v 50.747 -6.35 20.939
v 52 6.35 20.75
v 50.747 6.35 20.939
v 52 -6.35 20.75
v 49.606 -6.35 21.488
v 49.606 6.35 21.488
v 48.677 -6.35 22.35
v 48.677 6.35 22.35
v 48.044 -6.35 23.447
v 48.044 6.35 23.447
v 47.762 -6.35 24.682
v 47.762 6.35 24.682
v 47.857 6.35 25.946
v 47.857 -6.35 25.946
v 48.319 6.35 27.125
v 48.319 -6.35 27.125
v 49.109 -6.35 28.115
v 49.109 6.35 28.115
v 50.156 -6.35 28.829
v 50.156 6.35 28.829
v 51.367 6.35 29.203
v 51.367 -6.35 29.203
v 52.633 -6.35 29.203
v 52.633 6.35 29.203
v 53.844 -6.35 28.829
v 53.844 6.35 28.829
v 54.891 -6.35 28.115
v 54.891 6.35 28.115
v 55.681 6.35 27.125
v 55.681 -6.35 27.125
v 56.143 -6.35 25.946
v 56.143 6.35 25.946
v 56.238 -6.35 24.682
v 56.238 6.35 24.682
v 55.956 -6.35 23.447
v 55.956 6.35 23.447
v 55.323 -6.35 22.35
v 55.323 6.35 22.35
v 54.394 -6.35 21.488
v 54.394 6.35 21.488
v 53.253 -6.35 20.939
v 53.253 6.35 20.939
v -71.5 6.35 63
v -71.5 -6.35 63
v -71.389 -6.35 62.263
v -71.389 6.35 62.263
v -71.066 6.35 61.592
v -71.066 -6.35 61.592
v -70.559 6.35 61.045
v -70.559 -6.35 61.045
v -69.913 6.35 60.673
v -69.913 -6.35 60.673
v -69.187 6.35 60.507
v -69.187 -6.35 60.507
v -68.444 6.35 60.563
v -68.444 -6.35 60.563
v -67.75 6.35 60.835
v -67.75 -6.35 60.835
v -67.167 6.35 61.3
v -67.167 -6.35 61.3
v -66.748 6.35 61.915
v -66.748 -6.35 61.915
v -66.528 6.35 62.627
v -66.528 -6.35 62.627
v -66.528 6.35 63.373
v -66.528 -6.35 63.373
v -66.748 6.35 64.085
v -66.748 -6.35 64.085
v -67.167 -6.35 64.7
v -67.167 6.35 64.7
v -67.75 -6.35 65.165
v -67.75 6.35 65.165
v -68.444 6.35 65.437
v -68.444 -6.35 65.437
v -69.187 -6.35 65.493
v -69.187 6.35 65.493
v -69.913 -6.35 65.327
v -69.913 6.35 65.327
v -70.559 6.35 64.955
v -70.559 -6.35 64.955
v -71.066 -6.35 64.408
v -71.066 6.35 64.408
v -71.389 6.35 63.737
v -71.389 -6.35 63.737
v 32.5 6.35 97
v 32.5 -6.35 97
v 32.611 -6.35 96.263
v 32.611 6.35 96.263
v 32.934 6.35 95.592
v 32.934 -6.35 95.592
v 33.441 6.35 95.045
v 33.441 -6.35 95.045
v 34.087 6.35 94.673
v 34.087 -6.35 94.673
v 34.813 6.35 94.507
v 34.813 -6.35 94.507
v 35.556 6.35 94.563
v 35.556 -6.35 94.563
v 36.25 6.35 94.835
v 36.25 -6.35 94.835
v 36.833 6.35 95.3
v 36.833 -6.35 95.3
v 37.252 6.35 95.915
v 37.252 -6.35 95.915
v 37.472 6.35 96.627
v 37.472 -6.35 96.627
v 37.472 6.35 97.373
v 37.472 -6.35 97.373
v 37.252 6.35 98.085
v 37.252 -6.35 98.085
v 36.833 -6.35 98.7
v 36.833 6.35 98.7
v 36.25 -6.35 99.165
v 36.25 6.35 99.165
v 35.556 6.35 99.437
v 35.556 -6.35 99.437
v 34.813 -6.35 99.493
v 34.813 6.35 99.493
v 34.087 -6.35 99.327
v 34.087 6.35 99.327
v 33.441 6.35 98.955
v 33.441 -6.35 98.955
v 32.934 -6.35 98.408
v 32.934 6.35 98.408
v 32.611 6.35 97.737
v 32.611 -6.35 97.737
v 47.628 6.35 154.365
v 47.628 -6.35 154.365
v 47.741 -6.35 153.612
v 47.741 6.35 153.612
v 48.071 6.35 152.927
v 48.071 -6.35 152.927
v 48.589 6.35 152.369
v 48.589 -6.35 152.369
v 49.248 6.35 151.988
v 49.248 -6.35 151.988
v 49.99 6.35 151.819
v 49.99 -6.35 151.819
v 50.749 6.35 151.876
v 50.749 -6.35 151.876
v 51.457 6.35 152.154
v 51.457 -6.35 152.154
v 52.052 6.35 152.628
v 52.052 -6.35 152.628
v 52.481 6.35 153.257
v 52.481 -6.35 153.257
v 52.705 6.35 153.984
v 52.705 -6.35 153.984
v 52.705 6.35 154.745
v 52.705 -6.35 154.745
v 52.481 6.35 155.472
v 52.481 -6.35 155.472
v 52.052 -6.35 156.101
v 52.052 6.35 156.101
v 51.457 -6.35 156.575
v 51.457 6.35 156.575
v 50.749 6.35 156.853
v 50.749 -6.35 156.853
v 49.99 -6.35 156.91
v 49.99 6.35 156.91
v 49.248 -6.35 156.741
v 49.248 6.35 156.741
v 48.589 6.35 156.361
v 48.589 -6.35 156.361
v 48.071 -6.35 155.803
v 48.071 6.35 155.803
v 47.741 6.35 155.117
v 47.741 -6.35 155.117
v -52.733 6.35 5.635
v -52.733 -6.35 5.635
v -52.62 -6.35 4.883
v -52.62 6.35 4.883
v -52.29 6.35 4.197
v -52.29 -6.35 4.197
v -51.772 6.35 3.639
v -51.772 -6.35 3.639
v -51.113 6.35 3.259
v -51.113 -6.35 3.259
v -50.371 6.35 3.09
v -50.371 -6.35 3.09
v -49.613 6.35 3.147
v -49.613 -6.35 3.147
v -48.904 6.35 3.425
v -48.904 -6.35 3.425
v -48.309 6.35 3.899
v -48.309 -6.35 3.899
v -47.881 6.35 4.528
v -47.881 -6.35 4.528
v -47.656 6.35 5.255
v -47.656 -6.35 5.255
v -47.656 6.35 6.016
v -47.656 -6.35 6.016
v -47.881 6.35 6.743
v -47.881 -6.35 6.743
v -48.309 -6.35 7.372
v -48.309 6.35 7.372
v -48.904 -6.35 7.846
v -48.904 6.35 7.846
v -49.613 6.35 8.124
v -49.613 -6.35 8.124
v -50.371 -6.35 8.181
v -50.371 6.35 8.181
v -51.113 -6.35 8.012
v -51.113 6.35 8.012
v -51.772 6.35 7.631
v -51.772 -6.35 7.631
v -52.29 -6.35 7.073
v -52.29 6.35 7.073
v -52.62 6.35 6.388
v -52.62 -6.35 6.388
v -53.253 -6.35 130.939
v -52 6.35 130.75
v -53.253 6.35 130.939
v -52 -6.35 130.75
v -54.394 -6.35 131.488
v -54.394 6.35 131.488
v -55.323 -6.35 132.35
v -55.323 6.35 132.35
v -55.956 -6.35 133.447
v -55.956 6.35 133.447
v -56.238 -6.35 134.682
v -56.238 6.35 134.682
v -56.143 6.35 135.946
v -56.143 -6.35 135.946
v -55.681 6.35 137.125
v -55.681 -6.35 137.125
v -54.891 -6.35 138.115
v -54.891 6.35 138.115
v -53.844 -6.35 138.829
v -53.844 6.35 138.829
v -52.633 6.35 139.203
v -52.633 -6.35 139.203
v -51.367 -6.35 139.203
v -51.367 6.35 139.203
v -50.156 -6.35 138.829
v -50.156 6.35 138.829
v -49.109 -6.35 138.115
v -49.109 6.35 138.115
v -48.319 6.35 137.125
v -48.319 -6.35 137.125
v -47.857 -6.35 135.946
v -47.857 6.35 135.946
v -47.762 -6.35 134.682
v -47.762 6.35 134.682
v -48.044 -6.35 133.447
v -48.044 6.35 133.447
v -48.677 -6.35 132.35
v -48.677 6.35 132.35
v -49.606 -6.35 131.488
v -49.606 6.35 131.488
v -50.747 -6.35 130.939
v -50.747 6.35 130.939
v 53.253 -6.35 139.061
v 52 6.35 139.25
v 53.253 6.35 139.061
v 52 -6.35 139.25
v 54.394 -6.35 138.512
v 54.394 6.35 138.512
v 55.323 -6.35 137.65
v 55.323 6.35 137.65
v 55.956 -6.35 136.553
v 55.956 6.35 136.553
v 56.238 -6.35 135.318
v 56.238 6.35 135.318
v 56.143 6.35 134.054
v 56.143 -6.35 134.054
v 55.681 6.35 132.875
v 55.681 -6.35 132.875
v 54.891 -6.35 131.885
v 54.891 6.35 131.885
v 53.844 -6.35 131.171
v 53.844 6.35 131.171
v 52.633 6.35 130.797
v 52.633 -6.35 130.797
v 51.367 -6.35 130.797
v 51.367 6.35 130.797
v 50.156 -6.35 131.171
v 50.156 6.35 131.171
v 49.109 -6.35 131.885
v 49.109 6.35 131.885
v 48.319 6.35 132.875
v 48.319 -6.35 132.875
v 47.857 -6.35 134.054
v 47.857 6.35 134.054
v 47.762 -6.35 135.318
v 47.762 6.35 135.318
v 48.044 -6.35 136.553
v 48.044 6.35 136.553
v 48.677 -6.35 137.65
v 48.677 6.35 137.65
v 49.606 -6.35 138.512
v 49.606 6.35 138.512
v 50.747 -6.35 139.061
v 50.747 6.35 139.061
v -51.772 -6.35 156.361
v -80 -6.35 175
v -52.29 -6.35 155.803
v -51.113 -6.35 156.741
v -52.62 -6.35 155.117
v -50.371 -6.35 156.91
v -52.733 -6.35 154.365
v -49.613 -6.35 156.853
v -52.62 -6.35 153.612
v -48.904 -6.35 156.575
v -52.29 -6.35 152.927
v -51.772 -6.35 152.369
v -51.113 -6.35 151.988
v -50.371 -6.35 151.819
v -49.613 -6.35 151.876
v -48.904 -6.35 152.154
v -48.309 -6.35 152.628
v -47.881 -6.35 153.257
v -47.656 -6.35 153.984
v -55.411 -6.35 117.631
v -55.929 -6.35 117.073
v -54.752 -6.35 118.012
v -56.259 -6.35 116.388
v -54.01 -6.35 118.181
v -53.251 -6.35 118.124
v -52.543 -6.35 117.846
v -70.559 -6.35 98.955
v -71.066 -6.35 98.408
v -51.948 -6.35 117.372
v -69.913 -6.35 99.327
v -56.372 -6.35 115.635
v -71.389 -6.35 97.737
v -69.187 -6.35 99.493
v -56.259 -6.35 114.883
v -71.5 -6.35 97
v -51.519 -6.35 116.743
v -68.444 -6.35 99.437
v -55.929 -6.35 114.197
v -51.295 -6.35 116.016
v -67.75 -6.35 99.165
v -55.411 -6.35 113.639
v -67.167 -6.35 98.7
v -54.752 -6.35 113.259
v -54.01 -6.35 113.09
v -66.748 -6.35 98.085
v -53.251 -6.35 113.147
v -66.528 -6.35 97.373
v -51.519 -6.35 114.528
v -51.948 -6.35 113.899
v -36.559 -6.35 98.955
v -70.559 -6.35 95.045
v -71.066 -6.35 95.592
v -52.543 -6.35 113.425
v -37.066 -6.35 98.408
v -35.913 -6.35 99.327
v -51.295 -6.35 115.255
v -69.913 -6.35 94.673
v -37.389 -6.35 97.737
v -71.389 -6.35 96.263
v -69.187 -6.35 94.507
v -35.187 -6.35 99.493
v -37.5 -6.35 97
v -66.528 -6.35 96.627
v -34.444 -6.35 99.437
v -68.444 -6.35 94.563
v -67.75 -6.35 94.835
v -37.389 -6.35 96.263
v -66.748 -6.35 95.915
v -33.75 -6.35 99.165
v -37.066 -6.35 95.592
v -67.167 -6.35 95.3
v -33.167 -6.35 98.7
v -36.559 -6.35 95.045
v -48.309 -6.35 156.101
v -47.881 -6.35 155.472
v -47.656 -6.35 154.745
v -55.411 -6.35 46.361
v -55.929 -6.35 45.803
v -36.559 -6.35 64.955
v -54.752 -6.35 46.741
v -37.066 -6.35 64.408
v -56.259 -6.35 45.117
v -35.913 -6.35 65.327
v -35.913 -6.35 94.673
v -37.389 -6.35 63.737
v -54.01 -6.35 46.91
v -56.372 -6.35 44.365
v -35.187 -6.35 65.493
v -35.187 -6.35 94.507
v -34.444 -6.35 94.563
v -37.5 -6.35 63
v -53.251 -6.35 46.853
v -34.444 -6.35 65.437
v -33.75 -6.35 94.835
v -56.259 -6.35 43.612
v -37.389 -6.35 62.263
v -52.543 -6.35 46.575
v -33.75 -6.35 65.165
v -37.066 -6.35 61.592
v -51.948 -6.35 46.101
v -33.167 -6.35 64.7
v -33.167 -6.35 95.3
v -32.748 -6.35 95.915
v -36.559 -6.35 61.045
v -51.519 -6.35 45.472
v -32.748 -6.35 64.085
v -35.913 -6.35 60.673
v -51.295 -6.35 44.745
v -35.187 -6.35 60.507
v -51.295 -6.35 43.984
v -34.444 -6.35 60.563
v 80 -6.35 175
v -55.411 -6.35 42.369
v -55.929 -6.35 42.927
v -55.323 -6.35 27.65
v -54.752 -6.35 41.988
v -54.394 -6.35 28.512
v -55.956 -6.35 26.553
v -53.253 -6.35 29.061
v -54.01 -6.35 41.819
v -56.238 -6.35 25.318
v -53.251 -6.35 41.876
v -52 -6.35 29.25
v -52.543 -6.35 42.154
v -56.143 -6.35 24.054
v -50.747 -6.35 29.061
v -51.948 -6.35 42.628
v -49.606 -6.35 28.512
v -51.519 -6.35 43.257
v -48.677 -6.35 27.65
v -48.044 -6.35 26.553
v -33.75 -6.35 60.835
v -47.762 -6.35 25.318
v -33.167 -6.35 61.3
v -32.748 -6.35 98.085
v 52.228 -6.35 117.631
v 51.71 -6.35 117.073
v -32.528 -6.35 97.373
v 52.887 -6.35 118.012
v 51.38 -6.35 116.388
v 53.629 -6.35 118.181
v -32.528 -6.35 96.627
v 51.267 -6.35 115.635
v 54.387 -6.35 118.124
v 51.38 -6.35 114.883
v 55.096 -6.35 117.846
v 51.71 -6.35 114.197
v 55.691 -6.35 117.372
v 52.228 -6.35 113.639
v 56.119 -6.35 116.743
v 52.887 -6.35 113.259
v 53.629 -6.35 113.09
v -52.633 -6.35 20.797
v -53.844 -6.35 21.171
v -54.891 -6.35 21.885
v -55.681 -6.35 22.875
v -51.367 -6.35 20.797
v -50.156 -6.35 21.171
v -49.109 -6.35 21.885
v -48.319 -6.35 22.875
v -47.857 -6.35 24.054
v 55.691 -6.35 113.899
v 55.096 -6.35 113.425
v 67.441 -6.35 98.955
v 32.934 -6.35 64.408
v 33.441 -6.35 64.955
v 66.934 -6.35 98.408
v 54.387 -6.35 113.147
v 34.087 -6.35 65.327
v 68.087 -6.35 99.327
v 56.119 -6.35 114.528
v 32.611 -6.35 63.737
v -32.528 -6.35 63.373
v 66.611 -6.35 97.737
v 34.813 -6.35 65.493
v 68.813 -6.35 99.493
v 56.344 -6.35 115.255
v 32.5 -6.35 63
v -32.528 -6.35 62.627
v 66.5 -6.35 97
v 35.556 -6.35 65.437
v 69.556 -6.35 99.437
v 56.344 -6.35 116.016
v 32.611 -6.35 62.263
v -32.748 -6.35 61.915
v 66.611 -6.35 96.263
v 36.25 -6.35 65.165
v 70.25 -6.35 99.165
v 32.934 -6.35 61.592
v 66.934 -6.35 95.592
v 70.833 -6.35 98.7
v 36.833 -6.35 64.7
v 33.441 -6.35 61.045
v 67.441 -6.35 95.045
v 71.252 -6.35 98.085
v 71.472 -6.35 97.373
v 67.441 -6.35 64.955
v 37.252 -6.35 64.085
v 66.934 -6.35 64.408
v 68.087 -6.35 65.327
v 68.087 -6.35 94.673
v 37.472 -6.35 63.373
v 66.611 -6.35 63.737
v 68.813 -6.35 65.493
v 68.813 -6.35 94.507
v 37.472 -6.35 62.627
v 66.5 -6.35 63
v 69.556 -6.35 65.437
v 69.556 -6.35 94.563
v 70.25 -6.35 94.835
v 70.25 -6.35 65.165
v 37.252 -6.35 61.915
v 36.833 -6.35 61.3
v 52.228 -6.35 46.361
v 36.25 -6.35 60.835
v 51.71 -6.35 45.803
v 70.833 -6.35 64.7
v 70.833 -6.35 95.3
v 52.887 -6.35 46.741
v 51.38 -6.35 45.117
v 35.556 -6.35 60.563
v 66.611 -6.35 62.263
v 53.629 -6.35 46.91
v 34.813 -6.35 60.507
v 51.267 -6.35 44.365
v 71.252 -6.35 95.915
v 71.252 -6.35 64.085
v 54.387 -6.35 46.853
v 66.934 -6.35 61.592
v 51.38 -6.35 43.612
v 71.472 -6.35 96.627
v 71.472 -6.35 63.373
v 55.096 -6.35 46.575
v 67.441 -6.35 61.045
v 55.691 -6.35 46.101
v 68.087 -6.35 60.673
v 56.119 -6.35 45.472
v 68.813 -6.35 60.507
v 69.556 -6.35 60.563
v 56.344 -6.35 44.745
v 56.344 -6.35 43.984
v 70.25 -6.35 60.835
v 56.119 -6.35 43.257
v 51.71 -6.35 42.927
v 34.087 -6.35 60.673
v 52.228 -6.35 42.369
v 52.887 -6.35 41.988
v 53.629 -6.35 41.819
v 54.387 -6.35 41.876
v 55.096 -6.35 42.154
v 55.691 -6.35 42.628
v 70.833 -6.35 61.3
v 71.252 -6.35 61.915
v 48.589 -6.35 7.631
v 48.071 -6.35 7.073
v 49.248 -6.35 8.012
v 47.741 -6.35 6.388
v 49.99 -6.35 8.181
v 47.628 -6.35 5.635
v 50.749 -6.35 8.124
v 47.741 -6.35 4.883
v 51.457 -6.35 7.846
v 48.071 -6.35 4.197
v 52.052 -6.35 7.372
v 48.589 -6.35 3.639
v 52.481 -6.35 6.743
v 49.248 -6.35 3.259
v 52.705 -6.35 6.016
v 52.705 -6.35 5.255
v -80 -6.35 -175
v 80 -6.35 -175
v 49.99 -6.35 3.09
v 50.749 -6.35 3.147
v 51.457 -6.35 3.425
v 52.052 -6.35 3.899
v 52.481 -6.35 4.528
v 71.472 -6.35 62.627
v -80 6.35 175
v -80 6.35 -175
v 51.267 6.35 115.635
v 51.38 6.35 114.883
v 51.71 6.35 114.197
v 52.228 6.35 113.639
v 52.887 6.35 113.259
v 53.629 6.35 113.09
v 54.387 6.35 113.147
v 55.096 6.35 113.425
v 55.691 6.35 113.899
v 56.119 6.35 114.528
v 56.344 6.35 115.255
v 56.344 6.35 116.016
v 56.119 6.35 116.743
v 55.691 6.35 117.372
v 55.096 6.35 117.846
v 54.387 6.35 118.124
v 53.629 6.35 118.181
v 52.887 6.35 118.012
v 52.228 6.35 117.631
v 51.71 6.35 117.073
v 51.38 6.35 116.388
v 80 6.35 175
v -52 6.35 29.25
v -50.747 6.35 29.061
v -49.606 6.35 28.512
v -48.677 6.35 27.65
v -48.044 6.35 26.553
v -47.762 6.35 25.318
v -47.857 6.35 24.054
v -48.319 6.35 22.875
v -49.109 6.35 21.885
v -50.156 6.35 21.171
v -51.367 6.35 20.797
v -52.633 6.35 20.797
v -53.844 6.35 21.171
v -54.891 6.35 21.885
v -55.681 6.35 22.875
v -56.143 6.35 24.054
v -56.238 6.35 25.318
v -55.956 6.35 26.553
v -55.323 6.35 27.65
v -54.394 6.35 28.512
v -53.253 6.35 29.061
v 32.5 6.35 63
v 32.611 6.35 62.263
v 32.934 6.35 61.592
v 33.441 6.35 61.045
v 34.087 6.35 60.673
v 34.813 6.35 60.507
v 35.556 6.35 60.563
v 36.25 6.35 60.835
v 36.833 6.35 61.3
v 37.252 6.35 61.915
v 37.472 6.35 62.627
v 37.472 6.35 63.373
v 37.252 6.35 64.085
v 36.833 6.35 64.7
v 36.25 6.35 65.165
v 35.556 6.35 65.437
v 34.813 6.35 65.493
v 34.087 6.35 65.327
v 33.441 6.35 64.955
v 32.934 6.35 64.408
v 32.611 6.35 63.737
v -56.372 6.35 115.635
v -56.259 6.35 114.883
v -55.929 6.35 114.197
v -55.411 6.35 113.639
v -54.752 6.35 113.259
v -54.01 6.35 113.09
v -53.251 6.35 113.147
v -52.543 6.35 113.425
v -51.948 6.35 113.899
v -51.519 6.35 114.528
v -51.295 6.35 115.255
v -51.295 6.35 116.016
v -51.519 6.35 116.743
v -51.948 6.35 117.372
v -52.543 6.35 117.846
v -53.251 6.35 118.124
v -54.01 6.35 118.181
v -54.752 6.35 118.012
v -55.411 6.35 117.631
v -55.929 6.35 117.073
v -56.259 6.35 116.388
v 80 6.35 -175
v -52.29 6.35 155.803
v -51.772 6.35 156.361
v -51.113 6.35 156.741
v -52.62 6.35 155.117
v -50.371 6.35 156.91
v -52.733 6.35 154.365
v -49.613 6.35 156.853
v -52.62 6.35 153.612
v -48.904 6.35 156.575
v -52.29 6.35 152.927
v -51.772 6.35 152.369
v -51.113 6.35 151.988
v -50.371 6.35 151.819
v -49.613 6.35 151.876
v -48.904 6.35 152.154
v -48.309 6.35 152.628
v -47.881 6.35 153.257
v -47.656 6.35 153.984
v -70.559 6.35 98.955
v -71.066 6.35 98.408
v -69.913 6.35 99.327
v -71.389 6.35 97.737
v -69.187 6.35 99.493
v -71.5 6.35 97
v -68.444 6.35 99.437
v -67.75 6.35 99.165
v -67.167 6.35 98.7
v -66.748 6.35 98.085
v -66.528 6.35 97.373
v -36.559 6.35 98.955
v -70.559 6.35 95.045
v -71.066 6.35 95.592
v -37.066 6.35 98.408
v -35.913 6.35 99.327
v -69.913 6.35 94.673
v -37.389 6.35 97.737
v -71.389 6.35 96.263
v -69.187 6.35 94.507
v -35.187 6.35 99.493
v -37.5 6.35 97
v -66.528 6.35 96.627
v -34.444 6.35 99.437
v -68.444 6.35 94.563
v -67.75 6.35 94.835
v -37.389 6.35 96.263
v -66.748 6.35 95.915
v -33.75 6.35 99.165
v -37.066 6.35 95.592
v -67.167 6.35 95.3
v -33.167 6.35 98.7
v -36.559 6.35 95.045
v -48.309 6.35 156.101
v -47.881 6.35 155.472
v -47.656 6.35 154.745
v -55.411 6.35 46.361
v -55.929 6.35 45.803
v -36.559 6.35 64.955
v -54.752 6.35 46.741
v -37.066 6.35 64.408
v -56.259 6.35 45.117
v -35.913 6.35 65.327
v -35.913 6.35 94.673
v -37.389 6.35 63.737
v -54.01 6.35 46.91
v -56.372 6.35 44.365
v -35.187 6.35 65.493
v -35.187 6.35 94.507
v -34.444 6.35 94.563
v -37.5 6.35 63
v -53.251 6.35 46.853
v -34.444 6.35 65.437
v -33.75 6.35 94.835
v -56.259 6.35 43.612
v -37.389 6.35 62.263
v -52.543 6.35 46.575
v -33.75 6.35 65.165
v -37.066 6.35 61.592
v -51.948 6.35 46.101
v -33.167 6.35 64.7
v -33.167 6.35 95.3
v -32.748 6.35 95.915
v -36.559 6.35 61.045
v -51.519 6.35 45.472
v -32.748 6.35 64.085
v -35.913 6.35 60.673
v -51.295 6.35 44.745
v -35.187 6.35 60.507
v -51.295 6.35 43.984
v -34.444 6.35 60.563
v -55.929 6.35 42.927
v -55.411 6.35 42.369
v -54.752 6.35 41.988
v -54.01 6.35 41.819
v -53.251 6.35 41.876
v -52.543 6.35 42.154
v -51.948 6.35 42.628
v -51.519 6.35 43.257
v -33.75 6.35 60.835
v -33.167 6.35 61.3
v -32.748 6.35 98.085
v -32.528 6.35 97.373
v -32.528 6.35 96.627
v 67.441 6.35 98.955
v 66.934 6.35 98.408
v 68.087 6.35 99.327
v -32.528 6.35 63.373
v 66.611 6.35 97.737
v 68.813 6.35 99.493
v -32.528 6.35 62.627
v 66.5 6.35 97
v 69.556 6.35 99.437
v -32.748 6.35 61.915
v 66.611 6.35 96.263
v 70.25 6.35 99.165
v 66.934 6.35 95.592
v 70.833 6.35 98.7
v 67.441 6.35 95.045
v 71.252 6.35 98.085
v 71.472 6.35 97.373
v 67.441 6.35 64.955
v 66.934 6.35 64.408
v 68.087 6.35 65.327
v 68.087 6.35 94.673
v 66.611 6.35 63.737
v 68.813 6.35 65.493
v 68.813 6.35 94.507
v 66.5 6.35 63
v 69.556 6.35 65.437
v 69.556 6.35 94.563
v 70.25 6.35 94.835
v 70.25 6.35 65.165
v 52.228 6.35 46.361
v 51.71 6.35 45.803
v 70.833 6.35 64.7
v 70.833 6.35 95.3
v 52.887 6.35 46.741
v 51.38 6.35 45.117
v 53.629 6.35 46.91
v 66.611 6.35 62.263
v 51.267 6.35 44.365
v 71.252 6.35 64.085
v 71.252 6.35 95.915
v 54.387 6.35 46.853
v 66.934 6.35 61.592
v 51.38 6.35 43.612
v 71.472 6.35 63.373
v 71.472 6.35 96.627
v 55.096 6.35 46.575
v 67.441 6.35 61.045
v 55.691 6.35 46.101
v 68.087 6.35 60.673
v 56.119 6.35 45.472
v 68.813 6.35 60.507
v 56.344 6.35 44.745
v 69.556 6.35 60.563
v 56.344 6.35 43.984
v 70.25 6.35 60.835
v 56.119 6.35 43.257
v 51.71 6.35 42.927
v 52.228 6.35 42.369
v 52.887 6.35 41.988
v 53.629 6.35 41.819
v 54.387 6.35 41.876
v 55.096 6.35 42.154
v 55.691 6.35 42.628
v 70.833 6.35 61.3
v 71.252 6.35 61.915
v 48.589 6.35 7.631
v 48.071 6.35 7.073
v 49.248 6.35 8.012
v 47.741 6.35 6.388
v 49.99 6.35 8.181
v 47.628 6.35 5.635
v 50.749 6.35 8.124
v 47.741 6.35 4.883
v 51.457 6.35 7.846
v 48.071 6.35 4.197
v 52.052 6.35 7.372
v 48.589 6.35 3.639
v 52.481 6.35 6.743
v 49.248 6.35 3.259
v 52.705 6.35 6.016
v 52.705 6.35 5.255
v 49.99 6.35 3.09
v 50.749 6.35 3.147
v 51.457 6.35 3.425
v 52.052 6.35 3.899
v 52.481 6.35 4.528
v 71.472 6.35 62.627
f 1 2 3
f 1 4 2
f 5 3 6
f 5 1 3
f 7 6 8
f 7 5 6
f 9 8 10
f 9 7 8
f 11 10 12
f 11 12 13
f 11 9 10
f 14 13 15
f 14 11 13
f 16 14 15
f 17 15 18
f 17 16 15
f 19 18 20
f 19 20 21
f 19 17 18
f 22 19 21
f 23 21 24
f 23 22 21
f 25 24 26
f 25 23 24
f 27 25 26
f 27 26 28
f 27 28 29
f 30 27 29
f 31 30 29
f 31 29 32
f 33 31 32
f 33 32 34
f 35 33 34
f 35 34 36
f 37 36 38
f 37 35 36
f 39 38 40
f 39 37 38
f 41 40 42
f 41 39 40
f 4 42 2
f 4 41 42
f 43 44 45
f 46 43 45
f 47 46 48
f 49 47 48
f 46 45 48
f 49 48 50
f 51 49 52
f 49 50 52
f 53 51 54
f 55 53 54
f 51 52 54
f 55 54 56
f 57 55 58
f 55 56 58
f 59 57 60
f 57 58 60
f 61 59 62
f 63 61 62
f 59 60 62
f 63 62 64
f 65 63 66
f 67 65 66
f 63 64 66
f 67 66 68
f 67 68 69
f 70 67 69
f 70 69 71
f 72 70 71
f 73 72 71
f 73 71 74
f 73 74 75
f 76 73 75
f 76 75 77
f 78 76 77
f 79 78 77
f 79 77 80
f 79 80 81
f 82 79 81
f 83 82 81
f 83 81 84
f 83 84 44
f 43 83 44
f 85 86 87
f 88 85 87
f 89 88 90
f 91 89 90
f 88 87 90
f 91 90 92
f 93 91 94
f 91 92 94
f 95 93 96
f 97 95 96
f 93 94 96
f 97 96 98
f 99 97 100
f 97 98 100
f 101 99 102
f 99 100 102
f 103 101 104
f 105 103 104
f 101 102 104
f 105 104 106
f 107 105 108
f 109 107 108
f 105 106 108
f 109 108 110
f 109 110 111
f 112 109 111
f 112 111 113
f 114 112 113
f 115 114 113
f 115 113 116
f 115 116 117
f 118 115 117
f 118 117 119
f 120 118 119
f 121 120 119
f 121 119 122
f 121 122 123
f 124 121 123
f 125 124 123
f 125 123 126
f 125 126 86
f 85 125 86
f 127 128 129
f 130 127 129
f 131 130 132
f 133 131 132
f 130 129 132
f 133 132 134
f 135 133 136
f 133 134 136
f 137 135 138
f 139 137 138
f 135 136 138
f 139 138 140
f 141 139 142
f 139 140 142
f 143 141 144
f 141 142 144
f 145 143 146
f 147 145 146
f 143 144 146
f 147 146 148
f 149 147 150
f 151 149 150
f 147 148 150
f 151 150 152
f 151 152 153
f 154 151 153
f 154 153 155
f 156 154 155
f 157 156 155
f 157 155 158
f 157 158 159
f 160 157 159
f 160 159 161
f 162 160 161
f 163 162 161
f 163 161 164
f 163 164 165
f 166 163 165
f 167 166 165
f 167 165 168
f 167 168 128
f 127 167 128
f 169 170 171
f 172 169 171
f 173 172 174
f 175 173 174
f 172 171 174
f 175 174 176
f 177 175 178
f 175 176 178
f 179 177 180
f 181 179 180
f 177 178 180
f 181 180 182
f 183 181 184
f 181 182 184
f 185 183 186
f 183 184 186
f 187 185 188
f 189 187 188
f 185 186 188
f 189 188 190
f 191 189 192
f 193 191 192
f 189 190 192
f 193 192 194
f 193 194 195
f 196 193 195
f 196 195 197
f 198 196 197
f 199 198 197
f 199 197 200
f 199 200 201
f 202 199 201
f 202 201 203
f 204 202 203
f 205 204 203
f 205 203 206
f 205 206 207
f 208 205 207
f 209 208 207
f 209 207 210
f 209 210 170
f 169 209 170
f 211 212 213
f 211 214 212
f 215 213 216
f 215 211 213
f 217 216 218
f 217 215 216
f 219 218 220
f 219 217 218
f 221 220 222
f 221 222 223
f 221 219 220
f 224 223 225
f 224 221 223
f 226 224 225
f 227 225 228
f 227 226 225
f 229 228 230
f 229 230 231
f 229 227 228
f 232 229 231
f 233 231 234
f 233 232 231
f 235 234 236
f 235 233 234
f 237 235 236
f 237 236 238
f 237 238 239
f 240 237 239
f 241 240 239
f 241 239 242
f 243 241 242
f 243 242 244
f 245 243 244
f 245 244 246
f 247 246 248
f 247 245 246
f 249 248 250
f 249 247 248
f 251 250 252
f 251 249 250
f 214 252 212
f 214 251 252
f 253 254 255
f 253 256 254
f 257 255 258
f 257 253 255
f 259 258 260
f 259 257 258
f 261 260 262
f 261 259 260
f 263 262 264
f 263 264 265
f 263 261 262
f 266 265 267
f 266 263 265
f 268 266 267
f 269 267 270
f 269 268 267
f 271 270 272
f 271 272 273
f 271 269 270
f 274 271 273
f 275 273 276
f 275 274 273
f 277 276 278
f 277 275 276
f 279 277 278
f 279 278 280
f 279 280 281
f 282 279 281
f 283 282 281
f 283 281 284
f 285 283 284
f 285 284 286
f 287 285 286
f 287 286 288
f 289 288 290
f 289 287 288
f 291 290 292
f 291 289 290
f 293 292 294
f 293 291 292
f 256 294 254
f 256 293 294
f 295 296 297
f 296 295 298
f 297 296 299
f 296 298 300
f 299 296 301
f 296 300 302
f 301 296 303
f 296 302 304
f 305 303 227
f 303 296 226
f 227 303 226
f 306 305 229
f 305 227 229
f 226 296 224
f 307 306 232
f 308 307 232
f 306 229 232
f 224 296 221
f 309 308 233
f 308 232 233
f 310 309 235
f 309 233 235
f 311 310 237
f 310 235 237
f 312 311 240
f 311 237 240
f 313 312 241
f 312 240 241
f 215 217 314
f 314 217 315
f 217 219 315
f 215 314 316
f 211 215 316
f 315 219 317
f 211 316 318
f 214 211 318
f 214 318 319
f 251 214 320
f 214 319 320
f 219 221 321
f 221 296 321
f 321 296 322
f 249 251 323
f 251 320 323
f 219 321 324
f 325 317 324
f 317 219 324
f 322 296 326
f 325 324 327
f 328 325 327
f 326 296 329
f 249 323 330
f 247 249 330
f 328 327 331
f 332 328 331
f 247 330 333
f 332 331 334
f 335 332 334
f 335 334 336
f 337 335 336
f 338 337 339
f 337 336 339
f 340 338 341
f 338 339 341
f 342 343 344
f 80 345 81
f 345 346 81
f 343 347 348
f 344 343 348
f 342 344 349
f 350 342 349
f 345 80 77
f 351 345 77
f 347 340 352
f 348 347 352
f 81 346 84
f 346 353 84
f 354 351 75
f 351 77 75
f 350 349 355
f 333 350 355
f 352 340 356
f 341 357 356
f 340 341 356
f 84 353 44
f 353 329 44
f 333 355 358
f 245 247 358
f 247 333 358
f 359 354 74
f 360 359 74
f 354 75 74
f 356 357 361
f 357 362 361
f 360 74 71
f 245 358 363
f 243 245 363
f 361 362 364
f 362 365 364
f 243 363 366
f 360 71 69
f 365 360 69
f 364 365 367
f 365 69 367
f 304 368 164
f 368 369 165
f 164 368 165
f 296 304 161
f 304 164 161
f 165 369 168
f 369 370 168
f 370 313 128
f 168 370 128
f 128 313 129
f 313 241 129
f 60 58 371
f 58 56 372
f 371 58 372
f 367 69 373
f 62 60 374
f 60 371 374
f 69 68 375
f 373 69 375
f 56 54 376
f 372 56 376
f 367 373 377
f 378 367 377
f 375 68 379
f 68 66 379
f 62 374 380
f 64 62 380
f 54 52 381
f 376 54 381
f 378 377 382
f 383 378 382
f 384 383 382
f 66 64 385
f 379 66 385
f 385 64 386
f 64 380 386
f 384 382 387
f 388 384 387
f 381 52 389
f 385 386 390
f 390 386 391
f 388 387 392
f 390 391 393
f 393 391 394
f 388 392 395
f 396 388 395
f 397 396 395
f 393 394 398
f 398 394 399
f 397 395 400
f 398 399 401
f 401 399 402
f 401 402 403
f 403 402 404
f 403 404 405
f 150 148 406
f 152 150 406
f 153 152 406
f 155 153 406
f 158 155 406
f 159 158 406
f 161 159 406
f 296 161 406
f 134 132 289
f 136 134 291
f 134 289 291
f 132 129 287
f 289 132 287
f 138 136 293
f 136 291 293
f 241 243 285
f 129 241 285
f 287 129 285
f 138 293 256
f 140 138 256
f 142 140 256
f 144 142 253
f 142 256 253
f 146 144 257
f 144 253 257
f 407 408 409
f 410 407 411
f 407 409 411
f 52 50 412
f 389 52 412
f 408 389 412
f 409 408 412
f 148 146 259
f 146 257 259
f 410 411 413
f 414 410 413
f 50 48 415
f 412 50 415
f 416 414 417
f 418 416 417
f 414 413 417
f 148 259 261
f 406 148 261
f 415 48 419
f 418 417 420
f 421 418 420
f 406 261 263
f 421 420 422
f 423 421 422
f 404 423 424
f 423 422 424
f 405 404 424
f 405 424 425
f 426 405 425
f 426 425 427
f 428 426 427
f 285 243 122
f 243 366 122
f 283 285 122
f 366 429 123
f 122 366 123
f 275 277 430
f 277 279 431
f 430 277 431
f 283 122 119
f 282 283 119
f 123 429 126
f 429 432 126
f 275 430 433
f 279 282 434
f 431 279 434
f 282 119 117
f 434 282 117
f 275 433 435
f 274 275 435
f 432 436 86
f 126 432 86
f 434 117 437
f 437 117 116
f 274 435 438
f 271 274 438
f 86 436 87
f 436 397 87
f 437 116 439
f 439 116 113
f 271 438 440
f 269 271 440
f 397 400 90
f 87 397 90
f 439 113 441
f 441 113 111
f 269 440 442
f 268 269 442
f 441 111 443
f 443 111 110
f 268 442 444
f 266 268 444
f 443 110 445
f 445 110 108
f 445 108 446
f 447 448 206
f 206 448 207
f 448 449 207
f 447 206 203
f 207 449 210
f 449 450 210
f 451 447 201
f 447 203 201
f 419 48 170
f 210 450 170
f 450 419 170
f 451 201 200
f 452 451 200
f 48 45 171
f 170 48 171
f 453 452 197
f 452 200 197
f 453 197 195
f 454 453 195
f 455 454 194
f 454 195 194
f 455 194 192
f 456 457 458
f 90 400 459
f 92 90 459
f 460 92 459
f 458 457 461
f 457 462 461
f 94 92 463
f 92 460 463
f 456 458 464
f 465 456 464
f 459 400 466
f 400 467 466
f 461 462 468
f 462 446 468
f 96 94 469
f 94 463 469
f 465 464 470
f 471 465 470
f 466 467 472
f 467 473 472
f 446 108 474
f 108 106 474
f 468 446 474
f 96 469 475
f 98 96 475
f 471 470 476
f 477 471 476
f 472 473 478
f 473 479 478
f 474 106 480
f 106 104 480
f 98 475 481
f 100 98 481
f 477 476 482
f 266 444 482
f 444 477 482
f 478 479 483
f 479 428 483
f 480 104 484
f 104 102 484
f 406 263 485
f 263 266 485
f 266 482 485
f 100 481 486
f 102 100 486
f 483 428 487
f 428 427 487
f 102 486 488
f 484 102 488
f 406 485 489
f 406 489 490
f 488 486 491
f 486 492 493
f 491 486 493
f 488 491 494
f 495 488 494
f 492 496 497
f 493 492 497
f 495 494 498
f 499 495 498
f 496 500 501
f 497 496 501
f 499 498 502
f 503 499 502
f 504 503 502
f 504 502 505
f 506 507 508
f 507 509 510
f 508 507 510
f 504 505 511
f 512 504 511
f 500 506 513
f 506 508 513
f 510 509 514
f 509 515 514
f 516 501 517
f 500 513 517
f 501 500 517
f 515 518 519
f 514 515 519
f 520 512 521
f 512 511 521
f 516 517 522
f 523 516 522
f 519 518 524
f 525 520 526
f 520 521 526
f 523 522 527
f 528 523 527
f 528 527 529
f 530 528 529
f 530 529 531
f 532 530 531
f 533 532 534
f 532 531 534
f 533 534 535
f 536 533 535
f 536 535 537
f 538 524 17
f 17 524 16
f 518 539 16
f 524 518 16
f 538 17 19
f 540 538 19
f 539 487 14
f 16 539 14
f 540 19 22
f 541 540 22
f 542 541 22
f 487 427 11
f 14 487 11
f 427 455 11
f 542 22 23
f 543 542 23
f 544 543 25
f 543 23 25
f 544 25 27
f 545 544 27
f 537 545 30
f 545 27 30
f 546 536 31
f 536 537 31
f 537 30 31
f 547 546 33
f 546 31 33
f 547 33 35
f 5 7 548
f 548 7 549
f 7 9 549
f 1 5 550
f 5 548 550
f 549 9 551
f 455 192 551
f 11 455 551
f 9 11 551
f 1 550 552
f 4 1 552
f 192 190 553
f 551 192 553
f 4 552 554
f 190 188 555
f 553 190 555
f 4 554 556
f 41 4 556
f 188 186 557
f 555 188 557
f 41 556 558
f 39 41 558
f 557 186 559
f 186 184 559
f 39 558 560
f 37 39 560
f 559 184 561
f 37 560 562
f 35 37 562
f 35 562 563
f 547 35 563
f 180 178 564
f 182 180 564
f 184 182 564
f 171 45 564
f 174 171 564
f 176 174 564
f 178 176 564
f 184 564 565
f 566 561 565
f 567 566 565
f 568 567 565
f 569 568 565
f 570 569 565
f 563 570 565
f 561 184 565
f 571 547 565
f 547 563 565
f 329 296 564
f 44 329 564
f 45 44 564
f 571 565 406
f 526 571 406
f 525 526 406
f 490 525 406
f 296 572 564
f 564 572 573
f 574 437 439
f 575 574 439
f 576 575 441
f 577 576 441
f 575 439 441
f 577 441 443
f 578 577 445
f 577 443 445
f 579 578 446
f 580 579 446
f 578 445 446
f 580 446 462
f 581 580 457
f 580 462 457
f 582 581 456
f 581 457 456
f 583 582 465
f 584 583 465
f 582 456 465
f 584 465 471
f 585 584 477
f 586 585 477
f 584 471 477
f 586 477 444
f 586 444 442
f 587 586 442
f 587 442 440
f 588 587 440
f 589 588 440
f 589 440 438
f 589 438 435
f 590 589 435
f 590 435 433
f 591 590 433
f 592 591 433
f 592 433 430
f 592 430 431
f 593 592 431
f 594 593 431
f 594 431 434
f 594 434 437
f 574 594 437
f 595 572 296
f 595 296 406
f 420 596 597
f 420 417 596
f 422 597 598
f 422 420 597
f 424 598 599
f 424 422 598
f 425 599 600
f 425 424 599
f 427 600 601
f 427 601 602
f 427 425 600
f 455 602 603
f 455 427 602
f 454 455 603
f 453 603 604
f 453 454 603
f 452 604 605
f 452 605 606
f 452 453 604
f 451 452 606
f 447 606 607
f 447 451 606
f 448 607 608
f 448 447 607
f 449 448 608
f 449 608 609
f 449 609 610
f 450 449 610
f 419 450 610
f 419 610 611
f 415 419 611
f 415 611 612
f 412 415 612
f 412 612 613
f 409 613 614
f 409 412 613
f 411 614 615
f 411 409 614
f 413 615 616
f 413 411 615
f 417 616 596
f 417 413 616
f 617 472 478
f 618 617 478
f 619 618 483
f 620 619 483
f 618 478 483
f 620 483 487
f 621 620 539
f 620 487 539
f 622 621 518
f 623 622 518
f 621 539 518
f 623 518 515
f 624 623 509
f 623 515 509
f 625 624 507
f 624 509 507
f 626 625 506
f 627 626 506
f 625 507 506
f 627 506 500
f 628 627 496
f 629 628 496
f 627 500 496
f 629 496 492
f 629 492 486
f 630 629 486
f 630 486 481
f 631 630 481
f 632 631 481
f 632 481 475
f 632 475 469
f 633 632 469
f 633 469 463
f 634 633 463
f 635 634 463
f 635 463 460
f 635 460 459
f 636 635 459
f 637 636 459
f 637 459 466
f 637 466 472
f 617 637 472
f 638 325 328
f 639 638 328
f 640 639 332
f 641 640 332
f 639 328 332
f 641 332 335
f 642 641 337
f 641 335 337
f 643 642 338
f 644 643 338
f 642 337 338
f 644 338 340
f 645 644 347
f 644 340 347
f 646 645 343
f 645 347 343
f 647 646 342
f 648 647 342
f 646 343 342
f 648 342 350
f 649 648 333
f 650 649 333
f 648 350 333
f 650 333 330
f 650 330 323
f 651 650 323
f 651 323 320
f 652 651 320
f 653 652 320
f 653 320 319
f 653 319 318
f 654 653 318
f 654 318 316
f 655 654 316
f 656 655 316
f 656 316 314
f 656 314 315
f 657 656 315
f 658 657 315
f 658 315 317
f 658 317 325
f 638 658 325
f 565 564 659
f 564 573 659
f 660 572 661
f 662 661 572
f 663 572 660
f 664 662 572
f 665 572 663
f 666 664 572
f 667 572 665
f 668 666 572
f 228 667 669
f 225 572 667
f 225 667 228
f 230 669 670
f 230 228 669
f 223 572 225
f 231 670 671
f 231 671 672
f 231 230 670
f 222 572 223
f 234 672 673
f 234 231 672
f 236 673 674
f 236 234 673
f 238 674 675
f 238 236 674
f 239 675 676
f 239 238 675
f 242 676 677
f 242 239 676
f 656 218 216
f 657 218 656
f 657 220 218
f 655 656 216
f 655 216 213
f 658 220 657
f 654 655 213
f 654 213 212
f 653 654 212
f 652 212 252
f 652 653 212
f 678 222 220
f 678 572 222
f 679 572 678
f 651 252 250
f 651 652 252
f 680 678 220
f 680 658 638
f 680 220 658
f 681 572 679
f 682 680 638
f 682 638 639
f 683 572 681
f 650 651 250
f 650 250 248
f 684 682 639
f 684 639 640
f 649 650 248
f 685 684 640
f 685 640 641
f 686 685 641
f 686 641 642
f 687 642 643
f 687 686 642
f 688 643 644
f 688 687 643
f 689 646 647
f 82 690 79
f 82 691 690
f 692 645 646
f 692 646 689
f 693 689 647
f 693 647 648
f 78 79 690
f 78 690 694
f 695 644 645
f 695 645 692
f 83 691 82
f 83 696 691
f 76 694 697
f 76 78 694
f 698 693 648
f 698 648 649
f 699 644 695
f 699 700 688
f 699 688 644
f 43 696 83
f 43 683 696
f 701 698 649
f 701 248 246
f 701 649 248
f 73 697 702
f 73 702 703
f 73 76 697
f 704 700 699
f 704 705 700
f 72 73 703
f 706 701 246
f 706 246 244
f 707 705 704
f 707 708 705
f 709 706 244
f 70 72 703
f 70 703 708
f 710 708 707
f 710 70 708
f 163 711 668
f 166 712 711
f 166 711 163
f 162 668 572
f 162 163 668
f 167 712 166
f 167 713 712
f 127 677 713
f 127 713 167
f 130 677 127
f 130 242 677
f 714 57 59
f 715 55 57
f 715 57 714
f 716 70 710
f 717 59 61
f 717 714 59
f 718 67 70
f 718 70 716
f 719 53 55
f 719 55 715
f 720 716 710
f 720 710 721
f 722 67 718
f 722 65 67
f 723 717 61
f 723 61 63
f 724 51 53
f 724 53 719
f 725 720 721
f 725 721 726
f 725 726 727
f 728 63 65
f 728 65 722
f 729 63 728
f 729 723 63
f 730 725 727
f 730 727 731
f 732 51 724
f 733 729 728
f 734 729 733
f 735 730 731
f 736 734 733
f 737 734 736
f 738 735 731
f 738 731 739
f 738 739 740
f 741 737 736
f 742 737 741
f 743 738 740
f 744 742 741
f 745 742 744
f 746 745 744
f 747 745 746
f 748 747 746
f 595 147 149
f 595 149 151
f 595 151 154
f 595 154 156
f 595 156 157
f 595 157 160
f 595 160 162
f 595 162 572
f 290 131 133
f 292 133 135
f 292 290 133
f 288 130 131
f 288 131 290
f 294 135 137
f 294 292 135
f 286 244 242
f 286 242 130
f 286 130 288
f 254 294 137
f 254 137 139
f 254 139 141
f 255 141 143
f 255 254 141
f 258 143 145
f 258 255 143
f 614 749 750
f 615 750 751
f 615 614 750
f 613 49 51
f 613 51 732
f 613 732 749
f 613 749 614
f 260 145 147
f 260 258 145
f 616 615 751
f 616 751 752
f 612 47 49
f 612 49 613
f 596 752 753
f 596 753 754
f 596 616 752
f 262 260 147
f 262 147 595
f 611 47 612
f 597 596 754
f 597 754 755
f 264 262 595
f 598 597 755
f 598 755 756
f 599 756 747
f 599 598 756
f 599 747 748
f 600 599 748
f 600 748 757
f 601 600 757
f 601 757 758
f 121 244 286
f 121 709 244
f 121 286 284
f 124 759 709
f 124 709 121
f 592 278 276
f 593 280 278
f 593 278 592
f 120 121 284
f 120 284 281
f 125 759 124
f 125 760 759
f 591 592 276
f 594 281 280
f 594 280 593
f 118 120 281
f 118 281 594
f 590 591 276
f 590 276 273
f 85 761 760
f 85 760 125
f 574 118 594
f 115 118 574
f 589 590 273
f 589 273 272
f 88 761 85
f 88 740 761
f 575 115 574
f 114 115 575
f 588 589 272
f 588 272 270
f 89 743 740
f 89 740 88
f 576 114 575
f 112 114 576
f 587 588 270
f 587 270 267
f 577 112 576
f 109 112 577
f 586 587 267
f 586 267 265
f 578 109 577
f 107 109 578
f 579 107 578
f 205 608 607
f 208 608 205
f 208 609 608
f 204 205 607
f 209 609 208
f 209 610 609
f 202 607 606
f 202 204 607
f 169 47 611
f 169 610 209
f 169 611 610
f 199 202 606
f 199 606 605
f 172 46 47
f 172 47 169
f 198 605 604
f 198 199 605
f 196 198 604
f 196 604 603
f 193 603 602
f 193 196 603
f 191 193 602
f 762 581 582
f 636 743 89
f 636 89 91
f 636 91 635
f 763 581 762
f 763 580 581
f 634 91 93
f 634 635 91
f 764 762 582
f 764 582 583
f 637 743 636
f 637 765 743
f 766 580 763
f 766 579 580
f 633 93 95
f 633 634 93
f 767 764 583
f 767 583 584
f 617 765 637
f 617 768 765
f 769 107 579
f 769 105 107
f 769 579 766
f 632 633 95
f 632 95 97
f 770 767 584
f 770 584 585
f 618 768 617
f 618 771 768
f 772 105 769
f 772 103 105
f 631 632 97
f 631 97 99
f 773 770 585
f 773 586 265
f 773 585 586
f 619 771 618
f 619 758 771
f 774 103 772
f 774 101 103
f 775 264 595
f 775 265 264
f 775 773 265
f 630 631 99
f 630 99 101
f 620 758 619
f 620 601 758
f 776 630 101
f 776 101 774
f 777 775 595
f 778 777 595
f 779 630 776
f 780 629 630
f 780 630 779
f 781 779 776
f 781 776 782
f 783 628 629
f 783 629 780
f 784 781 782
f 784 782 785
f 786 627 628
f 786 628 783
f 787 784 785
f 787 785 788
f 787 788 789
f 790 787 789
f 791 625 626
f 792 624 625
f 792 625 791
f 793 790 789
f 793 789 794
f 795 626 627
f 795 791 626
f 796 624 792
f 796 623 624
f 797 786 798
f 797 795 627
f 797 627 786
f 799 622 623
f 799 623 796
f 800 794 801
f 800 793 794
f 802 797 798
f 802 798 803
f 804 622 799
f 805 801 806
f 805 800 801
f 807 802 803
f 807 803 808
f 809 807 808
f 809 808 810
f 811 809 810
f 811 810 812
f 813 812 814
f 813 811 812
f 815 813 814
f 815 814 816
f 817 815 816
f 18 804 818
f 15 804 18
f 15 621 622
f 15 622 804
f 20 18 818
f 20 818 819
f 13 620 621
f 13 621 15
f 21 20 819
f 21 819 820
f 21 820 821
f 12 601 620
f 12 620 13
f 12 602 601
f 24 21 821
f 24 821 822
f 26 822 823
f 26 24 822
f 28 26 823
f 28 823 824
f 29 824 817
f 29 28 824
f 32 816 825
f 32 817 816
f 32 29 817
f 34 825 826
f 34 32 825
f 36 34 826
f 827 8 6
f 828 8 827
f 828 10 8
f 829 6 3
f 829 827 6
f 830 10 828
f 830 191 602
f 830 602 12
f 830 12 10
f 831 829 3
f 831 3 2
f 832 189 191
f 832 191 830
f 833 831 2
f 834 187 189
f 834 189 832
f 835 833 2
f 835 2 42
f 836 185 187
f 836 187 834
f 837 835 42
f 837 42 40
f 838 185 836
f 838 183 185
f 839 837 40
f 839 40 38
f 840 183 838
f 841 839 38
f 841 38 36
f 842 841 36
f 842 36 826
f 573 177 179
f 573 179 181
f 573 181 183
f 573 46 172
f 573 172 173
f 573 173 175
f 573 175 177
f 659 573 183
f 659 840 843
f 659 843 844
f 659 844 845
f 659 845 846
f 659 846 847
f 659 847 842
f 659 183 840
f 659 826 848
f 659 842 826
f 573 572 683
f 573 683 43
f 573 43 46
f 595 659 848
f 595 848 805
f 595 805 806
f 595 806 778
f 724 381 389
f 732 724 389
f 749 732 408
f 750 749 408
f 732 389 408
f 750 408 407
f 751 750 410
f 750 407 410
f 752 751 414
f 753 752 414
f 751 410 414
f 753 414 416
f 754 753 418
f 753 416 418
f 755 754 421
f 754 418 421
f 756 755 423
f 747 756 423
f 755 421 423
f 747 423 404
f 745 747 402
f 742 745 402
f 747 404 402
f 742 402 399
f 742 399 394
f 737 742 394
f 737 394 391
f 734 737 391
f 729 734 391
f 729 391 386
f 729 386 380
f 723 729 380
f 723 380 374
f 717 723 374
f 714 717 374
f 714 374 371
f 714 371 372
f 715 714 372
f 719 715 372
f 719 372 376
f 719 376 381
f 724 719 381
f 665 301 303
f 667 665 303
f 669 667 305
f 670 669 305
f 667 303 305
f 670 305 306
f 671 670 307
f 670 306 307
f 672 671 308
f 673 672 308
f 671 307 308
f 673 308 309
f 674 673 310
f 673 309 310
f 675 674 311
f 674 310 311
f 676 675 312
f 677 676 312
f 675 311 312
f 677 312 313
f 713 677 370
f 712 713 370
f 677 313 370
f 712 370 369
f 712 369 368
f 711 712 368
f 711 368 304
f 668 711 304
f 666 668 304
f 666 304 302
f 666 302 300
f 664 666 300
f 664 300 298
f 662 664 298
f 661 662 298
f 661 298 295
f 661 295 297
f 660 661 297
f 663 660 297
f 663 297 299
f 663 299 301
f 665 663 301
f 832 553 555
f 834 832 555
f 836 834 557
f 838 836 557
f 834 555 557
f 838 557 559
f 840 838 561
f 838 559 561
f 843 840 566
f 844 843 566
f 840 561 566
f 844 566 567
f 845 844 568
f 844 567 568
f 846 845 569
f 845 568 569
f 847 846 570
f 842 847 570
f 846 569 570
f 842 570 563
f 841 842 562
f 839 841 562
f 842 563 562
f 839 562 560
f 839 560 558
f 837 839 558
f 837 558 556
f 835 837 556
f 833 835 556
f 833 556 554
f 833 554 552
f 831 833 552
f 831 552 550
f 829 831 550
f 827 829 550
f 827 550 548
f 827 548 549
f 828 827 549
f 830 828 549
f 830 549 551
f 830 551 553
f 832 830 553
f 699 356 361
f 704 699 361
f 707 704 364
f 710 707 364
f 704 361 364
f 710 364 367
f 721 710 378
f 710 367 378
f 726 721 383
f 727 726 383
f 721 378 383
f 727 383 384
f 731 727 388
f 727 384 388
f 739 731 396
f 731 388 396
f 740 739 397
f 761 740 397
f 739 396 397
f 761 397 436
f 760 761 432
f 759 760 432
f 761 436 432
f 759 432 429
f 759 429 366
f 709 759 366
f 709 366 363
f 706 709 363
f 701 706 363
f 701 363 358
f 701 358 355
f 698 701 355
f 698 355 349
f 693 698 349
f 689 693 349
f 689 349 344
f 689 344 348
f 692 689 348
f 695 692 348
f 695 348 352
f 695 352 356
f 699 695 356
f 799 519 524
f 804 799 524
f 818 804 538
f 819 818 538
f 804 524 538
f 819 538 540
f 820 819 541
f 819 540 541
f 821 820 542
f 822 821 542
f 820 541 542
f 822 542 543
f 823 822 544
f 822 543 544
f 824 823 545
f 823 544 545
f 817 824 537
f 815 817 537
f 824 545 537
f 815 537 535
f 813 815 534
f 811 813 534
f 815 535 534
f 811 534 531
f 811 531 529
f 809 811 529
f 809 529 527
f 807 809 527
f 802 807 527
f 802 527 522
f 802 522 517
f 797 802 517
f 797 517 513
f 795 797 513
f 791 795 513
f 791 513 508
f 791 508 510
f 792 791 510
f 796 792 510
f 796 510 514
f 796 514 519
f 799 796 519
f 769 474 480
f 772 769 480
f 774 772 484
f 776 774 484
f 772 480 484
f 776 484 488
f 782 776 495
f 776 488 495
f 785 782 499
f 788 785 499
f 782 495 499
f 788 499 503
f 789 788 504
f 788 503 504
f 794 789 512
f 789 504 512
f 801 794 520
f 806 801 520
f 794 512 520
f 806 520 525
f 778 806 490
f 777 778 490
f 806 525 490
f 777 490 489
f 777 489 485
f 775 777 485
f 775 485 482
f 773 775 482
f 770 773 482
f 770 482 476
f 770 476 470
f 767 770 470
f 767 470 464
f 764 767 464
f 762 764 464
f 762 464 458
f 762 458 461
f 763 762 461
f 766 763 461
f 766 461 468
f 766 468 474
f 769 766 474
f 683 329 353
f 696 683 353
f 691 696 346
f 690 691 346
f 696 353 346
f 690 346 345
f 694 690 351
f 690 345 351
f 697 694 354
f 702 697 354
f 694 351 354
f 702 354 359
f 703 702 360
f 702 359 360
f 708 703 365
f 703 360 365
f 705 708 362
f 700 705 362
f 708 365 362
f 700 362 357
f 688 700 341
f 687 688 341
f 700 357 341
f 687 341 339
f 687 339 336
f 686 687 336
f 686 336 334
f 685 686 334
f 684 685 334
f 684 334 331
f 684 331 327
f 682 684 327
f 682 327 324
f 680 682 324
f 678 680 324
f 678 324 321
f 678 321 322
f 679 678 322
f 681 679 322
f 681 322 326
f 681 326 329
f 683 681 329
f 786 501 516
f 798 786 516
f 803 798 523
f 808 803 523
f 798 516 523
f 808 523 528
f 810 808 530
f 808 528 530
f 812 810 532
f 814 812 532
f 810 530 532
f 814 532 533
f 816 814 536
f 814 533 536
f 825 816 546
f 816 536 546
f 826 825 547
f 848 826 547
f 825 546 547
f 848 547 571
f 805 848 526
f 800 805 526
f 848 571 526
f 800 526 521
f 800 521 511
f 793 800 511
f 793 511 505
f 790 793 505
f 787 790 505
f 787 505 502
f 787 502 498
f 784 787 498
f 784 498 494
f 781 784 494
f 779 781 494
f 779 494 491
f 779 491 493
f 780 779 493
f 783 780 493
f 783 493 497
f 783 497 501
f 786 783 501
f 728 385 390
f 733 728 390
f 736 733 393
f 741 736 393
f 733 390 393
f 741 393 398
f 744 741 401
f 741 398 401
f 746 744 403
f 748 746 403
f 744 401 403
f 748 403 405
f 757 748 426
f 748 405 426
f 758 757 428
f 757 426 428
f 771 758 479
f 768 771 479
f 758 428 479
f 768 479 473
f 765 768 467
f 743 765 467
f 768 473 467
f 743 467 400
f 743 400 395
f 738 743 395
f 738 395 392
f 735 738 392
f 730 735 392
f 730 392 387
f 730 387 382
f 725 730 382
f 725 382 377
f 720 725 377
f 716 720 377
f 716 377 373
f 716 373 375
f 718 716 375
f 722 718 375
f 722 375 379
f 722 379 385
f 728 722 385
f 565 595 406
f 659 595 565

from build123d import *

# Parameters (mm, degrees)
CROQUIS1_W                = 160
CROQUIS1_H                = 350
CROQUIS1_R                = 4.25
SALIENTE_EXTRUIR1_DEPTH   = 6.35
TALADRO_ROSCADO_1_4_201_D = 5.1054
TALADRO_ROSCADO_M6X1_01_D = 5


with BuildPart() as part:
    # Croquis1 → Saliente-Extruir1 (new, symmetric)
    with BuildSketch(Plane(origin=(0, 0, 0), x_dir=(1, 0, 0), z_dir=(0, 1, 0))):
        Rectangle(CROQUIS1_W, CROQUIS1_H)
        with Locations(Location((52, -135, 0), (0, 0, 270))):
            Circle(CROQUIS1_R, mode=Mode.SUBTRACT)
        with Locations(Location((52, -25, 0), (0, 0, 90))):
            Circle(CROQUIS1_R, mode=Mode.SUBTRACT)
        with Locations(Location((-52, -135, 0), (0, 0, 90))):
            Circle(CROQUIS1_R, mode=Mode.SUBTRACT)
        with Locations(Location((-52, -25, 0), (0, 0, 270))):
            Circle(CROQUIS1_R, mode=Mode.SUBTRACT)
    extrude(amount=SALIENTE_EXTRUIR1_DEPTH, both=True)

    # Taladro roscado 1/4-201 (through all)
    with Locations(Plane(origin=(0, 6.35, 0), x_dir=(1, 0, 0), z_dir=(0, 1, 0))):
        with Locations((50.180629632, -154.364720278), (53.819370368, -115.635279722), (50.180629632, -5.635279722), (53.819370368, -44.364720278), (-53.819370368, -44.364720278), (-50.180629632, -5.635279722), (-53.819370368, -115.635279722), (-50.180629632, -154.364720278)):
            Hole(TALADRO_ROSCADO_1_4_201_D / 2)

    # Taladro roscado M6x1.01 (through all)
    with Locations(Plane(origin=(0, 6.35, 0), x_dir=(1, 0, 0), z_dir=(0, 1, 0))):
        with Locations((69, -97), (35, -63), (35, -97), (69, -63), (-69, -63), (-35, -97), (-35, -63), (-69, -97)):
            Hole(TALADRO_ROSCADO_M6X1_01_D / 2)


solid = part.part
